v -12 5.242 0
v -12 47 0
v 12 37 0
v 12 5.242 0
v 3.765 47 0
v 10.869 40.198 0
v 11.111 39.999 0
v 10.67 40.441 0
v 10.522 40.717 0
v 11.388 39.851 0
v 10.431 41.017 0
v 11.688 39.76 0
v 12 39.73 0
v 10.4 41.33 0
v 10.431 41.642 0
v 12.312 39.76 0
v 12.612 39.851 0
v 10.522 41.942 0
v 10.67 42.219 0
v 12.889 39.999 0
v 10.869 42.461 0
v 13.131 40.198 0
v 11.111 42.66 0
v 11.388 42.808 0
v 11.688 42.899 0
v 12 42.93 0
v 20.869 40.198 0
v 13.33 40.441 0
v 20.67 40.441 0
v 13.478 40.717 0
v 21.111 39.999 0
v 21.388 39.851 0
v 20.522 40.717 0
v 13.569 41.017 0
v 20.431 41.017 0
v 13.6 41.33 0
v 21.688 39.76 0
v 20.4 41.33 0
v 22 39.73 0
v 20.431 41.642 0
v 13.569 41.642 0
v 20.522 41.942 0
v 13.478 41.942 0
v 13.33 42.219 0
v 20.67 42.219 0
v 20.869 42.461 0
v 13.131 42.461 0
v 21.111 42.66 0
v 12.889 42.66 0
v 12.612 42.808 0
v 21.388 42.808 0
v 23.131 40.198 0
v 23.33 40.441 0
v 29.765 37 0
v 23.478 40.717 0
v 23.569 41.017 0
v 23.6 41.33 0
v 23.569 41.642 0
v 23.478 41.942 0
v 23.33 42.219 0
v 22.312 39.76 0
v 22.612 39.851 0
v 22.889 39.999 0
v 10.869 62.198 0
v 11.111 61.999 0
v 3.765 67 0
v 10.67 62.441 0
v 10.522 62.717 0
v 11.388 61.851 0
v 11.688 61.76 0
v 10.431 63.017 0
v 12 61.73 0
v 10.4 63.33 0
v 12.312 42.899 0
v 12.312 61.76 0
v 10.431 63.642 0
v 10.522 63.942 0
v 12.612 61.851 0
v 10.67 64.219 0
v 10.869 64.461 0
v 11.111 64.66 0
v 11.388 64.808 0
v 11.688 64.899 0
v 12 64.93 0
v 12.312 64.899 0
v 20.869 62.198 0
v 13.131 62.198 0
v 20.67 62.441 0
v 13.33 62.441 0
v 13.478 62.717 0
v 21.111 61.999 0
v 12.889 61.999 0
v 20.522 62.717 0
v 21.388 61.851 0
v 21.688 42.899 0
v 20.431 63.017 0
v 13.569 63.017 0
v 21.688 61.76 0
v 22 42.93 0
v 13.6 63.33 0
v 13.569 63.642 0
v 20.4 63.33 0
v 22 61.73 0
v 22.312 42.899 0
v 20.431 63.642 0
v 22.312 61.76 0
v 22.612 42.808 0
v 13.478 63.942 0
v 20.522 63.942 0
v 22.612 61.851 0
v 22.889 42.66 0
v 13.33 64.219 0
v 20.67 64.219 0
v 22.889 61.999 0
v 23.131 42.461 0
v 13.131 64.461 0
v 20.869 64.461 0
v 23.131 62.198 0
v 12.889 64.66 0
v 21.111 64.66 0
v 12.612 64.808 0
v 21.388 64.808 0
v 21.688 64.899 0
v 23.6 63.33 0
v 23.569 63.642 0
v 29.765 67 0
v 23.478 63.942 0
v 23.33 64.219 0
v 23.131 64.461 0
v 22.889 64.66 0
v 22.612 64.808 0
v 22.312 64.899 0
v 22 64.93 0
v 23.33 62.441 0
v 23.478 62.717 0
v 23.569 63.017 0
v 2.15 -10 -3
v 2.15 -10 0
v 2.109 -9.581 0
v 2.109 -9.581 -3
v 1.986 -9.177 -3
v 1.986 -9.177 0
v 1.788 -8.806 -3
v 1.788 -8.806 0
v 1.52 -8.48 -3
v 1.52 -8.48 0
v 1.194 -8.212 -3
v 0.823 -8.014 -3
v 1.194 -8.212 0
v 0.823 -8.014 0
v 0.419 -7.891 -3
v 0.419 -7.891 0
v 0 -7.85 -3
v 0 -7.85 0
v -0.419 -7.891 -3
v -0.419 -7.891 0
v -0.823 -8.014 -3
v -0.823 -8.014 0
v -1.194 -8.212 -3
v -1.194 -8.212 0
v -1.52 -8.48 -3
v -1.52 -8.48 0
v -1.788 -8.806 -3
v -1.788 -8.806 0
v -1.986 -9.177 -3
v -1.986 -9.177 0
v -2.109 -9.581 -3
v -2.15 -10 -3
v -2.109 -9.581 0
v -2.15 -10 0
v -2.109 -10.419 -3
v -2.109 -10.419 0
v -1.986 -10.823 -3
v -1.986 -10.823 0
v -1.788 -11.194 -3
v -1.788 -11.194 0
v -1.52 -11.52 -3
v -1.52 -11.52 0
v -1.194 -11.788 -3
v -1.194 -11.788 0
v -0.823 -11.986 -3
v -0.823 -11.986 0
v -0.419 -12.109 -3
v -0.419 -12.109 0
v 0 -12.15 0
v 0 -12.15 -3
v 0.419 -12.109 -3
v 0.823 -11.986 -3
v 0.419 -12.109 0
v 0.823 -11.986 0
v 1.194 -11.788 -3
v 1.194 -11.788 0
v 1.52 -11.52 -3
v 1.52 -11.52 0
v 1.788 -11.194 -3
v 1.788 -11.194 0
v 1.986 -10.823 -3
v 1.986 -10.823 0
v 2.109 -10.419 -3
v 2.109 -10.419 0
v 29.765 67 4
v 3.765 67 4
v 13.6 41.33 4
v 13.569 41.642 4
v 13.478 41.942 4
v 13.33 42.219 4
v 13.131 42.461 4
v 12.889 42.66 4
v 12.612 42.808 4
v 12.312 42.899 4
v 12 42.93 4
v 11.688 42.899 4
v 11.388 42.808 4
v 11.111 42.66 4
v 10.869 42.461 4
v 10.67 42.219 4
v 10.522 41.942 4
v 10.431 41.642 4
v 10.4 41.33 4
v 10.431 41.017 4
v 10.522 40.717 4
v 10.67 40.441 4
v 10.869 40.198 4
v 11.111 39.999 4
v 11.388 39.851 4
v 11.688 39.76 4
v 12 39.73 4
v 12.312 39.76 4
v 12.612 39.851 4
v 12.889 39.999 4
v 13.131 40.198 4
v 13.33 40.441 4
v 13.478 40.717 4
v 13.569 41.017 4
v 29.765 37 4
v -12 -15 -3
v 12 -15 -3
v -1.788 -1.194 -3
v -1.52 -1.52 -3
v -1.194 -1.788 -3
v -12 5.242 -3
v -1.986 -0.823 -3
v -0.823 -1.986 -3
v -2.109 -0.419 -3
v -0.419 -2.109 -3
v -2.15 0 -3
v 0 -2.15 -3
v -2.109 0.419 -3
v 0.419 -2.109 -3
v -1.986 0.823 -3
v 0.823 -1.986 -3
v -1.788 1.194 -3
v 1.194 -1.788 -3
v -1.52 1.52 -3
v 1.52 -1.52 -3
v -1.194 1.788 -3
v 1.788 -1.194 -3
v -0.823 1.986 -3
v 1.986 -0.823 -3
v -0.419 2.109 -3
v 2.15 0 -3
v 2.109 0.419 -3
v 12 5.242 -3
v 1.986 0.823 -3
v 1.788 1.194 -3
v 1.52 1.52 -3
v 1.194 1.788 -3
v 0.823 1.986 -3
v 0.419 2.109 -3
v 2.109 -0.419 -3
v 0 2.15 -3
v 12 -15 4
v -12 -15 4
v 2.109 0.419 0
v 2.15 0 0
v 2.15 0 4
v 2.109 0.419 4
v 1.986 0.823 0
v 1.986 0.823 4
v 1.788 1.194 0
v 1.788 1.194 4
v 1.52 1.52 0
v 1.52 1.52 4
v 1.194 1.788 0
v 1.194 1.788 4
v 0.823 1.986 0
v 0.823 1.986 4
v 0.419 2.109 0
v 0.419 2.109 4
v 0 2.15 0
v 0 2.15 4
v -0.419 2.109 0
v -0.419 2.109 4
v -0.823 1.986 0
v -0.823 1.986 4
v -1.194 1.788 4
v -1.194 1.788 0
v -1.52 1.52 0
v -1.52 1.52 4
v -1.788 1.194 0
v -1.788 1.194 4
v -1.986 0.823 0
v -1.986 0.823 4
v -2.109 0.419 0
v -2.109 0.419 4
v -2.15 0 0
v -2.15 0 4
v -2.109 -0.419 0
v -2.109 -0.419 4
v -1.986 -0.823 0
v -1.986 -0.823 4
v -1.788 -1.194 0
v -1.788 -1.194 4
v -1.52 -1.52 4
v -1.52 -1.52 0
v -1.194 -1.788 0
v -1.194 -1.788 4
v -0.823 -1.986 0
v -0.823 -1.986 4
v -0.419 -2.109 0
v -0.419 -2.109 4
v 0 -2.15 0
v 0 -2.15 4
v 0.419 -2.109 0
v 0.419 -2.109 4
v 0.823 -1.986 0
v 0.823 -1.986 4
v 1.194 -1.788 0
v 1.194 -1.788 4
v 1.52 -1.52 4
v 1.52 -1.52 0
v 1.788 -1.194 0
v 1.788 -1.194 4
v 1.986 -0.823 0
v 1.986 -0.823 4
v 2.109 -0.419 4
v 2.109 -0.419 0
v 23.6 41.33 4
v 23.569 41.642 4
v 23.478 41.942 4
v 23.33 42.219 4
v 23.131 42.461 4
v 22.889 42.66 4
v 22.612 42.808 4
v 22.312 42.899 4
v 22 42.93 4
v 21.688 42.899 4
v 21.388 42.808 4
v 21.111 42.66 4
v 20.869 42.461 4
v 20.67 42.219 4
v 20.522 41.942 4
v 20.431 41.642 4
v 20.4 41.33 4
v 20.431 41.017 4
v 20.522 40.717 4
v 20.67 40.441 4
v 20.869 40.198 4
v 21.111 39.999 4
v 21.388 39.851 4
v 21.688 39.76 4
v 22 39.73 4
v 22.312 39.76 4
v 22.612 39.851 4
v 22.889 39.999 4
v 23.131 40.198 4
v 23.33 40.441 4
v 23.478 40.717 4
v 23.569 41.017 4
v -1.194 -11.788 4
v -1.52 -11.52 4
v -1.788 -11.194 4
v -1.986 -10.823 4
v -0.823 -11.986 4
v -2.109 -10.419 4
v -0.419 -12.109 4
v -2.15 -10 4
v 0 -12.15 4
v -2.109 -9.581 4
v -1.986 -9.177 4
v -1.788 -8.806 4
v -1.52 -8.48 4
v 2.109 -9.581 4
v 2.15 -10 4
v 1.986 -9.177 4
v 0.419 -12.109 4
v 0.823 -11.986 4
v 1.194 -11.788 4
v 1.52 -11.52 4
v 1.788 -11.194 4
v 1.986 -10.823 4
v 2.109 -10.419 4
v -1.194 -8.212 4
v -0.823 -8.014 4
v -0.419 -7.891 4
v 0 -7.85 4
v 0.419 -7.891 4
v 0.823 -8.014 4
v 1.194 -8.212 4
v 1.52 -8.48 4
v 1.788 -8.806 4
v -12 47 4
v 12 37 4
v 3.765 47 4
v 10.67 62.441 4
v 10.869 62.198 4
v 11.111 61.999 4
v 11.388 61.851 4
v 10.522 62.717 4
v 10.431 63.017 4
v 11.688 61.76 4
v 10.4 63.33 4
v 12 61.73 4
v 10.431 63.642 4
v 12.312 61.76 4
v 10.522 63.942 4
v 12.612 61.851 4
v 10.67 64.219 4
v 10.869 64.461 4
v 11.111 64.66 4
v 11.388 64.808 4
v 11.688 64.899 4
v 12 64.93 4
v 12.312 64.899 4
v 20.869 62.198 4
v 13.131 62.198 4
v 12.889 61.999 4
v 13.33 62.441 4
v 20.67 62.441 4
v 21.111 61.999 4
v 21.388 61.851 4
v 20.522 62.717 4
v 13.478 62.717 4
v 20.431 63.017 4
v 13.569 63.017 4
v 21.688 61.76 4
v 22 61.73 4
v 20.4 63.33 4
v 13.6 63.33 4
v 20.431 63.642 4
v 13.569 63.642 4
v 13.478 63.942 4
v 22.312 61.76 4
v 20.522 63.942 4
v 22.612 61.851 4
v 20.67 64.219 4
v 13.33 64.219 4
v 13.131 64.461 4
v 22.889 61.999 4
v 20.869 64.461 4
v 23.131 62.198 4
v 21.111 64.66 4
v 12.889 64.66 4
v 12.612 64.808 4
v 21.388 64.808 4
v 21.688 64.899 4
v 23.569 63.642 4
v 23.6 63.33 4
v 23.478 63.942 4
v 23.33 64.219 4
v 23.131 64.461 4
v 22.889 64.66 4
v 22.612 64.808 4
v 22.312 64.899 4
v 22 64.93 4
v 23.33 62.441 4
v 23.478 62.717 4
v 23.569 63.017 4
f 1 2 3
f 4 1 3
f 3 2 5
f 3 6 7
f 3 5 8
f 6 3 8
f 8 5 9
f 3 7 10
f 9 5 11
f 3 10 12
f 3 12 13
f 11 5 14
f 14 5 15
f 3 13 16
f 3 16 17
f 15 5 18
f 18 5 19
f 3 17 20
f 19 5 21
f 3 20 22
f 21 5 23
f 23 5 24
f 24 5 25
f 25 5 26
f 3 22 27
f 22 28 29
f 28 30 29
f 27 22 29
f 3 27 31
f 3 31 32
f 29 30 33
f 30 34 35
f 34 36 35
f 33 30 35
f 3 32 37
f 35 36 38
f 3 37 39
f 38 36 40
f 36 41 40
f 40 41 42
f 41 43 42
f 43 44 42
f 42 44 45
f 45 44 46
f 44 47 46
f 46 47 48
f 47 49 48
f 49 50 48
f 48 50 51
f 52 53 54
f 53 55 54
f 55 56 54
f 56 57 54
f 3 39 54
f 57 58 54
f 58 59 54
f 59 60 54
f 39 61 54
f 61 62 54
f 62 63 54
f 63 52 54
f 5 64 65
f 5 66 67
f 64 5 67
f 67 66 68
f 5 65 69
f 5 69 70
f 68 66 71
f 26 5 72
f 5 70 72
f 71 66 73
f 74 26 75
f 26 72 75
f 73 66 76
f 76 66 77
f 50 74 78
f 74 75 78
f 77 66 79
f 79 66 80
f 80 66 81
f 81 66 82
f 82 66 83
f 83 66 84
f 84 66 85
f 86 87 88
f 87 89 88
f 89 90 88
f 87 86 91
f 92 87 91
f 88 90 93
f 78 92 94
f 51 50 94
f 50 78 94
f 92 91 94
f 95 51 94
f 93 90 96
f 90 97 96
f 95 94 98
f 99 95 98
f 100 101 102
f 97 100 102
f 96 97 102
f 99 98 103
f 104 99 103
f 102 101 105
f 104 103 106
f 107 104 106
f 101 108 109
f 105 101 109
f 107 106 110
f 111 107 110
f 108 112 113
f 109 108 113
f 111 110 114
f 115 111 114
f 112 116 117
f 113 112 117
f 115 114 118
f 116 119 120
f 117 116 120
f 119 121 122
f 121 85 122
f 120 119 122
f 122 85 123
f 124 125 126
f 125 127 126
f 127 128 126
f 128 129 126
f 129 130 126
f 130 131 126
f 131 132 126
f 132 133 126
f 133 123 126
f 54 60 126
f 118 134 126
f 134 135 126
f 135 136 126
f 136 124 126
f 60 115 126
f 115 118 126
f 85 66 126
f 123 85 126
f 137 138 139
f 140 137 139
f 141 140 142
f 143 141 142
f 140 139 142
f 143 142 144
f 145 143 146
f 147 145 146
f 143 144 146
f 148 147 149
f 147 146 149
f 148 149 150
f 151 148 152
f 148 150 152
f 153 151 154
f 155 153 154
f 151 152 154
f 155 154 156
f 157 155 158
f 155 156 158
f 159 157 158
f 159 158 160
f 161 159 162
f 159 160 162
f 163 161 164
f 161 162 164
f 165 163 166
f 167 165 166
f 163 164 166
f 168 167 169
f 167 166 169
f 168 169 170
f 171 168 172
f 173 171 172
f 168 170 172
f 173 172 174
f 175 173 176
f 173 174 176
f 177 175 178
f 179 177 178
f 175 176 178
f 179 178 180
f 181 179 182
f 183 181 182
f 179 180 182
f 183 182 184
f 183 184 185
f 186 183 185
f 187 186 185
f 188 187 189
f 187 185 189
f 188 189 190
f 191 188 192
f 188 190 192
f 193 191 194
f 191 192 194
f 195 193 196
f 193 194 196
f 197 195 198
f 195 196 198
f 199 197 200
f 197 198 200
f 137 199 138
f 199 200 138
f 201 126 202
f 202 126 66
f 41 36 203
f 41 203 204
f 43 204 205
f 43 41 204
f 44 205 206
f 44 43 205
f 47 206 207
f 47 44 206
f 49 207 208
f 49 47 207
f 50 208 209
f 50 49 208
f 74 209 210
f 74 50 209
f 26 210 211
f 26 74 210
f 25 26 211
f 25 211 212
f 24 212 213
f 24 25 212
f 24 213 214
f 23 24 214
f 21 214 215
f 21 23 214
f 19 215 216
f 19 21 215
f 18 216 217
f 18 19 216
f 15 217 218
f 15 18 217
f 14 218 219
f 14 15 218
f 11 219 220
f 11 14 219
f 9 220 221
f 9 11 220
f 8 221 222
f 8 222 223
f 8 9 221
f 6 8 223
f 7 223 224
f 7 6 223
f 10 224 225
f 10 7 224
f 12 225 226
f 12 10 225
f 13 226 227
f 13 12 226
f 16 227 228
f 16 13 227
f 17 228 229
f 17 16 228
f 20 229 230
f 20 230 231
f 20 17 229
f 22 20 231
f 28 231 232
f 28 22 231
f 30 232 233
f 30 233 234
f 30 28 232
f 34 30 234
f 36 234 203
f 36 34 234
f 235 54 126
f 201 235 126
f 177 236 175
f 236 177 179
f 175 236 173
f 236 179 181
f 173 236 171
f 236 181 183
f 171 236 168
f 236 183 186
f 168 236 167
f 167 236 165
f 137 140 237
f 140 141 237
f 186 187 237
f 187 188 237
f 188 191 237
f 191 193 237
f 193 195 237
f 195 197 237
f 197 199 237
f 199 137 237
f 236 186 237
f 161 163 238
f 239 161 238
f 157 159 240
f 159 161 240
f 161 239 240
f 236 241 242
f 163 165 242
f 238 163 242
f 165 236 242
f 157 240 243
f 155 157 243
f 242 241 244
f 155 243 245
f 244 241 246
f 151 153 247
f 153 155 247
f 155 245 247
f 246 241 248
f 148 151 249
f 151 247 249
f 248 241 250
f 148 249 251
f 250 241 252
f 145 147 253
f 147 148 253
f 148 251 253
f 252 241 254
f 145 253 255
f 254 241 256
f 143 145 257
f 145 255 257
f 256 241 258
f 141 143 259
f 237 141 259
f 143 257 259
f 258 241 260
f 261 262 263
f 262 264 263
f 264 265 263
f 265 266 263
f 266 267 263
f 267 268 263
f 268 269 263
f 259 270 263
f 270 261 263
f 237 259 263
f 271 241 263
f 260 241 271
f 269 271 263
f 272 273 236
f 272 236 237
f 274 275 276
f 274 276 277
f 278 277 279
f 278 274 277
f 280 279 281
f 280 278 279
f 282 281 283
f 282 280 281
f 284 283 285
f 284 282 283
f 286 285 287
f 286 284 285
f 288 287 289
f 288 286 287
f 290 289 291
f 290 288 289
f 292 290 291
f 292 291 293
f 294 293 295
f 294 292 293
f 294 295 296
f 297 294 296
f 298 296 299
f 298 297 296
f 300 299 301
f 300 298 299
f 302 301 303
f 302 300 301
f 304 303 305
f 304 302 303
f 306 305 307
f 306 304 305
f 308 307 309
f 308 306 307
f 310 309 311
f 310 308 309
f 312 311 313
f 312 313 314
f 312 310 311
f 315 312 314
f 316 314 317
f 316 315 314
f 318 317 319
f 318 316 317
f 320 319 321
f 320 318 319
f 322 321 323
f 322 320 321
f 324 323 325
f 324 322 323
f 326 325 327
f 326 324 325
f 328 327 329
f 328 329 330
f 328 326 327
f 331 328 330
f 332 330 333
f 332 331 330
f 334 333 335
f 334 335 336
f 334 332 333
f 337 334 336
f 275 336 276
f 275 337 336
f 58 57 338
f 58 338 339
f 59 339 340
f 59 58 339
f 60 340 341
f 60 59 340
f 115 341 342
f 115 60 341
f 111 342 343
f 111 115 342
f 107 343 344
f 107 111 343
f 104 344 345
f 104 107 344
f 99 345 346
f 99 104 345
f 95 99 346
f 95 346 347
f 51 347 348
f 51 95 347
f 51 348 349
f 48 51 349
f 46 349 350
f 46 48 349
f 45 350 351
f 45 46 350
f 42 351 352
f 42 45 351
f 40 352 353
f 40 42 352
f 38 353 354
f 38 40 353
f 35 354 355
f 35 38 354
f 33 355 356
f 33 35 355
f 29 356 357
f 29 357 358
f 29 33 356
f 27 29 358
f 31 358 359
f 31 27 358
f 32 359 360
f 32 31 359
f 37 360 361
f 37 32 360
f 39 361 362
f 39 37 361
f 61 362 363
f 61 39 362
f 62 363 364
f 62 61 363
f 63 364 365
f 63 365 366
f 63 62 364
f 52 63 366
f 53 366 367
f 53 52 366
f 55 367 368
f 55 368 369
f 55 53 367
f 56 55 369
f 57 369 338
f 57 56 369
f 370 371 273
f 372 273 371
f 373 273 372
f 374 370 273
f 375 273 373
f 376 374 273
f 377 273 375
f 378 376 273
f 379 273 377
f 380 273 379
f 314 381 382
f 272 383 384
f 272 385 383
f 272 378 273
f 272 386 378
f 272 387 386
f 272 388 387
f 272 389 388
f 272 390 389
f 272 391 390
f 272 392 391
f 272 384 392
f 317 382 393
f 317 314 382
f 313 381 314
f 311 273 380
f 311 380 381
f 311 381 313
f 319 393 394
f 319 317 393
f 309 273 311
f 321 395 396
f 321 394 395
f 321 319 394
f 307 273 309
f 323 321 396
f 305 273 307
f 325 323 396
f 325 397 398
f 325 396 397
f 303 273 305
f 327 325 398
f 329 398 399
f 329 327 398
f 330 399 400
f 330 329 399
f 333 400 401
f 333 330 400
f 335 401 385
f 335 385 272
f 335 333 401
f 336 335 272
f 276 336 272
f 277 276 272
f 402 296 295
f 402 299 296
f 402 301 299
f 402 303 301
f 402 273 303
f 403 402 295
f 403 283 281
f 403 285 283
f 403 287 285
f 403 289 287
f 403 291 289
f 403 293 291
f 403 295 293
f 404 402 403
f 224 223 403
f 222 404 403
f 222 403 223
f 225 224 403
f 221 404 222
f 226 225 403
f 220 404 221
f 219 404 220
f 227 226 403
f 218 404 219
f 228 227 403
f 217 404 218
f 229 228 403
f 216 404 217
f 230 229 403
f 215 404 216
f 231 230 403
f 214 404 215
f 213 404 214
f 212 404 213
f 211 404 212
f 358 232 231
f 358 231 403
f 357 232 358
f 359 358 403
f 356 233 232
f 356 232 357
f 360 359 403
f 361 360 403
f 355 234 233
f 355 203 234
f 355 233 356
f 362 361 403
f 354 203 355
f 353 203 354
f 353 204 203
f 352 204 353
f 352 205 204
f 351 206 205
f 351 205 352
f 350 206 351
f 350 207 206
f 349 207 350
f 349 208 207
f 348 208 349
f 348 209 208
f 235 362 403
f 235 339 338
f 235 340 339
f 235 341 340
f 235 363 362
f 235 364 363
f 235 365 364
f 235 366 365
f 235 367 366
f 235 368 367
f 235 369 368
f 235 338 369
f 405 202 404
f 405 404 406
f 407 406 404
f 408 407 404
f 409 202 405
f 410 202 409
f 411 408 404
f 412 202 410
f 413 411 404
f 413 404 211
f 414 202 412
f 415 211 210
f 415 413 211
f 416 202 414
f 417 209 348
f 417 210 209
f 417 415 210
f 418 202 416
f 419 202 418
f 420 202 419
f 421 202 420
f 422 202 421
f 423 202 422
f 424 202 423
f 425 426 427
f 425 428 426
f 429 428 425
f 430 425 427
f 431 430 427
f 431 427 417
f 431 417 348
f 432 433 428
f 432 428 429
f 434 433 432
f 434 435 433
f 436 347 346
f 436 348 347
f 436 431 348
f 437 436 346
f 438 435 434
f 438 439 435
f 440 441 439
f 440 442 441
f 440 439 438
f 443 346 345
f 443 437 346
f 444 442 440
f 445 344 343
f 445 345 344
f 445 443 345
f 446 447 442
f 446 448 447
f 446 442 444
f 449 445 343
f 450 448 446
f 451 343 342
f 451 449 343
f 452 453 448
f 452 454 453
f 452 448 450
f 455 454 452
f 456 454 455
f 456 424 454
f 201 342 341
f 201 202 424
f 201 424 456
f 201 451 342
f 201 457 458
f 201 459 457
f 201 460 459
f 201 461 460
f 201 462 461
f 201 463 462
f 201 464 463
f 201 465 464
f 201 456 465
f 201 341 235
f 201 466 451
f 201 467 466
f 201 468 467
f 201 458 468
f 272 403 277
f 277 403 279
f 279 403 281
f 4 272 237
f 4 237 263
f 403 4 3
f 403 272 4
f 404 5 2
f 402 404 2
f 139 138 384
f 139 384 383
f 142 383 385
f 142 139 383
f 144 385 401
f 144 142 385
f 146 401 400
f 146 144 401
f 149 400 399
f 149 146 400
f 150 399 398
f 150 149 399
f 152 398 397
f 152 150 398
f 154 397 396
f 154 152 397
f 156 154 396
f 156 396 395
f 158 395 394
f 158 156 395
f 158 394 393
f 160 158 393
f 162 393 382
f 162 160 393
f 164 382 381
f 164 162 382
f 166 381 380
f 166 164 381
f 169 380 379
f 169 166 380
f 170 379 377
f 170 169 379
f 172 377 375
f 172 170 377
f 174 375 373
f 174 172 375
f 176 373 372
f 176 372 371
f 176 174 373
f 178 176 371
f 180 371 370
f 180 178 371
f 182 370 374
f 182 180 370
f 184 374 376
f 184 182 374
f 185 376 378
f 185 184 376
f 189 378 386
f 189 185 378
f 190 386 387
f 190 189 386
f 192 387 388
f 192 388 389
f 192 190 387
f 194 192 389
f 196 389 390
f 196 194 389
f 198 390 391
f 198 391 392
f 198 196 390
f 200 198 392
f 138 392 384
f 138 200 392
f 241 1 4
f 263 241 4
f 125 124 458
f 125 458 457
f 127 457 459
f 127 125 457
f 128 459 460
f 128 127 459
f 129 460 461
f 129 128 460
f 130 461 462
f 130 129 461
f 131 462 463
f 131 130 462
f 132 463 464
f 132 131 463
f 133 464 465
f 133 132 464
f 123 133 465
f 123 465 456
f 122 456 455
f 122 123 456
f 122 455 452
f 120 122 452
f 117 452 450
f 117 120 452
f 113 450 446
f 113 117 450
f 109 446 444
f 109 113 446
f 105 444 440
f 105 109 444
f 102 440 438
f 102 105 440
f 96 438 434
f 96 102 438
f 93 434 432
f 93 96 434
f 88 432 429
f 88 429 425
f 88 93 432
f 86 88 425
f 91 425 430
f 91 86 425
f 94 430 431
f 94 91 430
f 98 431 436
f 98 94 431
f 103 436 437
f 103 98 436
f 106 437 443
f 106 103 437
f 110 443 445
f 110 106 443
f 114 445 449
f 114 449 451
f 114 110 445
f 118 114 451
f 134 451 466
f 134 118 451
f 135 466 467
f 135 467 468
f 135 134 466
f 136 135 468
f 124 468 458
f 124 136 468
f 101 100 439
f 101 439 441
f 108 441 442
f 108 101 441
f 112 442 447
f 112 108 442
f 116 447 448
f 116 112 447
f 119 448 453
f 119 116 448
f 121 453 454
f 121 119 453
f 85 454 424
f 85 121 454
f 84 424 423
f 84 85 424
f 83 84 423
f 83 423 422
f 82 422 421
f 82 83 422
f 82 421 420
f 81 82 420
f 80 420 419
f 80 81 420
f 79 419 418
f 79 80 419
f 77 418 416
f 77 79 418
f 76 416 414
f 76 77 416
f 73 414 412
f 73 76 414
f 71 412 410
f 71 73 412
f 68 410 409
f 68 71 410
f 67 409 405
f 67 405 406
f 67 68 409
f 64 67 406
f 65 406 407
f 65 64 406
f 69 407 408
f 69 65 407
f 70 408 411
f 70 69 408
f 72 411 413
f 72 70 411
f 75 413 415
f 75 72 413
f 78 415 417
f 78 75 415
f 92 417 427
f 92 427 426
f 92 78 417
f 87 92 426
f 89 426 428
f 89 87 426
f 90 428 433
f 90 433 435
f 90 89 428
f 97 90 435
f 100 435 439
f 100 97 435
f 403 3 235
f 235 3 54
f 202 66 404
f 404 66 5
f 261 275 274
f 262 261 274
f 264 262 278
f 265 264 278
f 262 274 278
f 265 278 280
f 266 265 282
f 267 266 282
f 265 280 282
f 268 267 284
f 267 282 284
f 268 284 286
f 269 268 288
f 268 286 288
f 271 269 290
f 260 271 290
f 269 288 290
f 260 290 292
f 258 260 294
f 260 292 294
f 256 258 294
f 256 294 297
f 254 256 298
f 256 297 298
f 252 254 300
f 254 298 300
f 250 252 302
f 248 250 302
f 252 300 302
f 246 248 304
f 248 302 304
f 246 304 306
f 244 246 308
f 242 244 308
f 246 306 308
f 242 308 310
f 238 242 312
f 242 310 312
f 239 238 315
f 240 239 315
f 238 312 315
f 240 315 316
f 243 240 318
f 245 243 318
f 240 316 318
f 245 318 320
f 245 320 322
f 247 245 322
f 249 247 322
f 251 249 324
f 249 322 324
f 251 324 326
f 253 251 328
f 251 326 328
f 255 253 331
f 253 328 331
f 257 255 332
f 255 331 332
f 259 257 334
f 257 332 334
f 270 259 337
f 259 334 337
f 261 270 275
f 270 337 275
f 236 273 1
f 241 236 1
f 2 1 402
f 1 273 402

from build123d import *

# Parameters (mm, degrees)
F0_R     = 1.6
F0_W     = 24
F0_H     = 20.2417488769
F0_R_2   = 2.15
F1_DEPTH = 4
F2_DEPTH = 3


# Not quite as in the source:
# - a feature names something its author has since deleted; it is built from what else it names


with BuildPart() as f1:
    # F0 (on Top) → F1 (new body)
    with BuildSketch(Plane.XY):
        Polygon((-12, 47), (-12, 5.2417488769), (12, 5.2417488769), (12, 37), (29.7651190069, 37), (29.7651190069, 67), (3.7651190069, 67), (3.7651190069, 47), align=None)
        with Locations((12, 41.3295961916)):
            Circle(F0_R, mode=Mode.SUBTRACT)
        with Locations((22, 41.3295961916)):
            Circle(F0_R, mode=Mode.SUBTRACT)
        with Locations((12, 63.3295961916)):
            Circle(F0_R, mode=Mode.SUBTRACT)
        with Locations((22, 63.3295961916)):
            Circle(F0_R, mode=Mode.SUBTRACT)
        with Locations((0, -4.8791255616)):
            Rectangle(F0_W, F0_H)
        with Locations((0, -10)):
            Circle(F0_R_2, mode=Mode.SUBTRACT)
        Circle(F0_R_2, mode=Mode.SUBTRACT)
    extrude(amount=F1_DEPTH)

    # F0 (on Top) → F2 (join)
    with BuildSketch(Plane.XY):
        with Locations((0, -4.8791255616)):
            Rectangle(F0_W, F0_H)
        with Locations((0, -10)):
            Circle(F0_R_2, mode=Mode.SUBTRACT)
        Circle(F0_R_2, mode=Mode.SUBTRACT)
    extrude(amount=-F2_DEPTH)


solid = f1.part
